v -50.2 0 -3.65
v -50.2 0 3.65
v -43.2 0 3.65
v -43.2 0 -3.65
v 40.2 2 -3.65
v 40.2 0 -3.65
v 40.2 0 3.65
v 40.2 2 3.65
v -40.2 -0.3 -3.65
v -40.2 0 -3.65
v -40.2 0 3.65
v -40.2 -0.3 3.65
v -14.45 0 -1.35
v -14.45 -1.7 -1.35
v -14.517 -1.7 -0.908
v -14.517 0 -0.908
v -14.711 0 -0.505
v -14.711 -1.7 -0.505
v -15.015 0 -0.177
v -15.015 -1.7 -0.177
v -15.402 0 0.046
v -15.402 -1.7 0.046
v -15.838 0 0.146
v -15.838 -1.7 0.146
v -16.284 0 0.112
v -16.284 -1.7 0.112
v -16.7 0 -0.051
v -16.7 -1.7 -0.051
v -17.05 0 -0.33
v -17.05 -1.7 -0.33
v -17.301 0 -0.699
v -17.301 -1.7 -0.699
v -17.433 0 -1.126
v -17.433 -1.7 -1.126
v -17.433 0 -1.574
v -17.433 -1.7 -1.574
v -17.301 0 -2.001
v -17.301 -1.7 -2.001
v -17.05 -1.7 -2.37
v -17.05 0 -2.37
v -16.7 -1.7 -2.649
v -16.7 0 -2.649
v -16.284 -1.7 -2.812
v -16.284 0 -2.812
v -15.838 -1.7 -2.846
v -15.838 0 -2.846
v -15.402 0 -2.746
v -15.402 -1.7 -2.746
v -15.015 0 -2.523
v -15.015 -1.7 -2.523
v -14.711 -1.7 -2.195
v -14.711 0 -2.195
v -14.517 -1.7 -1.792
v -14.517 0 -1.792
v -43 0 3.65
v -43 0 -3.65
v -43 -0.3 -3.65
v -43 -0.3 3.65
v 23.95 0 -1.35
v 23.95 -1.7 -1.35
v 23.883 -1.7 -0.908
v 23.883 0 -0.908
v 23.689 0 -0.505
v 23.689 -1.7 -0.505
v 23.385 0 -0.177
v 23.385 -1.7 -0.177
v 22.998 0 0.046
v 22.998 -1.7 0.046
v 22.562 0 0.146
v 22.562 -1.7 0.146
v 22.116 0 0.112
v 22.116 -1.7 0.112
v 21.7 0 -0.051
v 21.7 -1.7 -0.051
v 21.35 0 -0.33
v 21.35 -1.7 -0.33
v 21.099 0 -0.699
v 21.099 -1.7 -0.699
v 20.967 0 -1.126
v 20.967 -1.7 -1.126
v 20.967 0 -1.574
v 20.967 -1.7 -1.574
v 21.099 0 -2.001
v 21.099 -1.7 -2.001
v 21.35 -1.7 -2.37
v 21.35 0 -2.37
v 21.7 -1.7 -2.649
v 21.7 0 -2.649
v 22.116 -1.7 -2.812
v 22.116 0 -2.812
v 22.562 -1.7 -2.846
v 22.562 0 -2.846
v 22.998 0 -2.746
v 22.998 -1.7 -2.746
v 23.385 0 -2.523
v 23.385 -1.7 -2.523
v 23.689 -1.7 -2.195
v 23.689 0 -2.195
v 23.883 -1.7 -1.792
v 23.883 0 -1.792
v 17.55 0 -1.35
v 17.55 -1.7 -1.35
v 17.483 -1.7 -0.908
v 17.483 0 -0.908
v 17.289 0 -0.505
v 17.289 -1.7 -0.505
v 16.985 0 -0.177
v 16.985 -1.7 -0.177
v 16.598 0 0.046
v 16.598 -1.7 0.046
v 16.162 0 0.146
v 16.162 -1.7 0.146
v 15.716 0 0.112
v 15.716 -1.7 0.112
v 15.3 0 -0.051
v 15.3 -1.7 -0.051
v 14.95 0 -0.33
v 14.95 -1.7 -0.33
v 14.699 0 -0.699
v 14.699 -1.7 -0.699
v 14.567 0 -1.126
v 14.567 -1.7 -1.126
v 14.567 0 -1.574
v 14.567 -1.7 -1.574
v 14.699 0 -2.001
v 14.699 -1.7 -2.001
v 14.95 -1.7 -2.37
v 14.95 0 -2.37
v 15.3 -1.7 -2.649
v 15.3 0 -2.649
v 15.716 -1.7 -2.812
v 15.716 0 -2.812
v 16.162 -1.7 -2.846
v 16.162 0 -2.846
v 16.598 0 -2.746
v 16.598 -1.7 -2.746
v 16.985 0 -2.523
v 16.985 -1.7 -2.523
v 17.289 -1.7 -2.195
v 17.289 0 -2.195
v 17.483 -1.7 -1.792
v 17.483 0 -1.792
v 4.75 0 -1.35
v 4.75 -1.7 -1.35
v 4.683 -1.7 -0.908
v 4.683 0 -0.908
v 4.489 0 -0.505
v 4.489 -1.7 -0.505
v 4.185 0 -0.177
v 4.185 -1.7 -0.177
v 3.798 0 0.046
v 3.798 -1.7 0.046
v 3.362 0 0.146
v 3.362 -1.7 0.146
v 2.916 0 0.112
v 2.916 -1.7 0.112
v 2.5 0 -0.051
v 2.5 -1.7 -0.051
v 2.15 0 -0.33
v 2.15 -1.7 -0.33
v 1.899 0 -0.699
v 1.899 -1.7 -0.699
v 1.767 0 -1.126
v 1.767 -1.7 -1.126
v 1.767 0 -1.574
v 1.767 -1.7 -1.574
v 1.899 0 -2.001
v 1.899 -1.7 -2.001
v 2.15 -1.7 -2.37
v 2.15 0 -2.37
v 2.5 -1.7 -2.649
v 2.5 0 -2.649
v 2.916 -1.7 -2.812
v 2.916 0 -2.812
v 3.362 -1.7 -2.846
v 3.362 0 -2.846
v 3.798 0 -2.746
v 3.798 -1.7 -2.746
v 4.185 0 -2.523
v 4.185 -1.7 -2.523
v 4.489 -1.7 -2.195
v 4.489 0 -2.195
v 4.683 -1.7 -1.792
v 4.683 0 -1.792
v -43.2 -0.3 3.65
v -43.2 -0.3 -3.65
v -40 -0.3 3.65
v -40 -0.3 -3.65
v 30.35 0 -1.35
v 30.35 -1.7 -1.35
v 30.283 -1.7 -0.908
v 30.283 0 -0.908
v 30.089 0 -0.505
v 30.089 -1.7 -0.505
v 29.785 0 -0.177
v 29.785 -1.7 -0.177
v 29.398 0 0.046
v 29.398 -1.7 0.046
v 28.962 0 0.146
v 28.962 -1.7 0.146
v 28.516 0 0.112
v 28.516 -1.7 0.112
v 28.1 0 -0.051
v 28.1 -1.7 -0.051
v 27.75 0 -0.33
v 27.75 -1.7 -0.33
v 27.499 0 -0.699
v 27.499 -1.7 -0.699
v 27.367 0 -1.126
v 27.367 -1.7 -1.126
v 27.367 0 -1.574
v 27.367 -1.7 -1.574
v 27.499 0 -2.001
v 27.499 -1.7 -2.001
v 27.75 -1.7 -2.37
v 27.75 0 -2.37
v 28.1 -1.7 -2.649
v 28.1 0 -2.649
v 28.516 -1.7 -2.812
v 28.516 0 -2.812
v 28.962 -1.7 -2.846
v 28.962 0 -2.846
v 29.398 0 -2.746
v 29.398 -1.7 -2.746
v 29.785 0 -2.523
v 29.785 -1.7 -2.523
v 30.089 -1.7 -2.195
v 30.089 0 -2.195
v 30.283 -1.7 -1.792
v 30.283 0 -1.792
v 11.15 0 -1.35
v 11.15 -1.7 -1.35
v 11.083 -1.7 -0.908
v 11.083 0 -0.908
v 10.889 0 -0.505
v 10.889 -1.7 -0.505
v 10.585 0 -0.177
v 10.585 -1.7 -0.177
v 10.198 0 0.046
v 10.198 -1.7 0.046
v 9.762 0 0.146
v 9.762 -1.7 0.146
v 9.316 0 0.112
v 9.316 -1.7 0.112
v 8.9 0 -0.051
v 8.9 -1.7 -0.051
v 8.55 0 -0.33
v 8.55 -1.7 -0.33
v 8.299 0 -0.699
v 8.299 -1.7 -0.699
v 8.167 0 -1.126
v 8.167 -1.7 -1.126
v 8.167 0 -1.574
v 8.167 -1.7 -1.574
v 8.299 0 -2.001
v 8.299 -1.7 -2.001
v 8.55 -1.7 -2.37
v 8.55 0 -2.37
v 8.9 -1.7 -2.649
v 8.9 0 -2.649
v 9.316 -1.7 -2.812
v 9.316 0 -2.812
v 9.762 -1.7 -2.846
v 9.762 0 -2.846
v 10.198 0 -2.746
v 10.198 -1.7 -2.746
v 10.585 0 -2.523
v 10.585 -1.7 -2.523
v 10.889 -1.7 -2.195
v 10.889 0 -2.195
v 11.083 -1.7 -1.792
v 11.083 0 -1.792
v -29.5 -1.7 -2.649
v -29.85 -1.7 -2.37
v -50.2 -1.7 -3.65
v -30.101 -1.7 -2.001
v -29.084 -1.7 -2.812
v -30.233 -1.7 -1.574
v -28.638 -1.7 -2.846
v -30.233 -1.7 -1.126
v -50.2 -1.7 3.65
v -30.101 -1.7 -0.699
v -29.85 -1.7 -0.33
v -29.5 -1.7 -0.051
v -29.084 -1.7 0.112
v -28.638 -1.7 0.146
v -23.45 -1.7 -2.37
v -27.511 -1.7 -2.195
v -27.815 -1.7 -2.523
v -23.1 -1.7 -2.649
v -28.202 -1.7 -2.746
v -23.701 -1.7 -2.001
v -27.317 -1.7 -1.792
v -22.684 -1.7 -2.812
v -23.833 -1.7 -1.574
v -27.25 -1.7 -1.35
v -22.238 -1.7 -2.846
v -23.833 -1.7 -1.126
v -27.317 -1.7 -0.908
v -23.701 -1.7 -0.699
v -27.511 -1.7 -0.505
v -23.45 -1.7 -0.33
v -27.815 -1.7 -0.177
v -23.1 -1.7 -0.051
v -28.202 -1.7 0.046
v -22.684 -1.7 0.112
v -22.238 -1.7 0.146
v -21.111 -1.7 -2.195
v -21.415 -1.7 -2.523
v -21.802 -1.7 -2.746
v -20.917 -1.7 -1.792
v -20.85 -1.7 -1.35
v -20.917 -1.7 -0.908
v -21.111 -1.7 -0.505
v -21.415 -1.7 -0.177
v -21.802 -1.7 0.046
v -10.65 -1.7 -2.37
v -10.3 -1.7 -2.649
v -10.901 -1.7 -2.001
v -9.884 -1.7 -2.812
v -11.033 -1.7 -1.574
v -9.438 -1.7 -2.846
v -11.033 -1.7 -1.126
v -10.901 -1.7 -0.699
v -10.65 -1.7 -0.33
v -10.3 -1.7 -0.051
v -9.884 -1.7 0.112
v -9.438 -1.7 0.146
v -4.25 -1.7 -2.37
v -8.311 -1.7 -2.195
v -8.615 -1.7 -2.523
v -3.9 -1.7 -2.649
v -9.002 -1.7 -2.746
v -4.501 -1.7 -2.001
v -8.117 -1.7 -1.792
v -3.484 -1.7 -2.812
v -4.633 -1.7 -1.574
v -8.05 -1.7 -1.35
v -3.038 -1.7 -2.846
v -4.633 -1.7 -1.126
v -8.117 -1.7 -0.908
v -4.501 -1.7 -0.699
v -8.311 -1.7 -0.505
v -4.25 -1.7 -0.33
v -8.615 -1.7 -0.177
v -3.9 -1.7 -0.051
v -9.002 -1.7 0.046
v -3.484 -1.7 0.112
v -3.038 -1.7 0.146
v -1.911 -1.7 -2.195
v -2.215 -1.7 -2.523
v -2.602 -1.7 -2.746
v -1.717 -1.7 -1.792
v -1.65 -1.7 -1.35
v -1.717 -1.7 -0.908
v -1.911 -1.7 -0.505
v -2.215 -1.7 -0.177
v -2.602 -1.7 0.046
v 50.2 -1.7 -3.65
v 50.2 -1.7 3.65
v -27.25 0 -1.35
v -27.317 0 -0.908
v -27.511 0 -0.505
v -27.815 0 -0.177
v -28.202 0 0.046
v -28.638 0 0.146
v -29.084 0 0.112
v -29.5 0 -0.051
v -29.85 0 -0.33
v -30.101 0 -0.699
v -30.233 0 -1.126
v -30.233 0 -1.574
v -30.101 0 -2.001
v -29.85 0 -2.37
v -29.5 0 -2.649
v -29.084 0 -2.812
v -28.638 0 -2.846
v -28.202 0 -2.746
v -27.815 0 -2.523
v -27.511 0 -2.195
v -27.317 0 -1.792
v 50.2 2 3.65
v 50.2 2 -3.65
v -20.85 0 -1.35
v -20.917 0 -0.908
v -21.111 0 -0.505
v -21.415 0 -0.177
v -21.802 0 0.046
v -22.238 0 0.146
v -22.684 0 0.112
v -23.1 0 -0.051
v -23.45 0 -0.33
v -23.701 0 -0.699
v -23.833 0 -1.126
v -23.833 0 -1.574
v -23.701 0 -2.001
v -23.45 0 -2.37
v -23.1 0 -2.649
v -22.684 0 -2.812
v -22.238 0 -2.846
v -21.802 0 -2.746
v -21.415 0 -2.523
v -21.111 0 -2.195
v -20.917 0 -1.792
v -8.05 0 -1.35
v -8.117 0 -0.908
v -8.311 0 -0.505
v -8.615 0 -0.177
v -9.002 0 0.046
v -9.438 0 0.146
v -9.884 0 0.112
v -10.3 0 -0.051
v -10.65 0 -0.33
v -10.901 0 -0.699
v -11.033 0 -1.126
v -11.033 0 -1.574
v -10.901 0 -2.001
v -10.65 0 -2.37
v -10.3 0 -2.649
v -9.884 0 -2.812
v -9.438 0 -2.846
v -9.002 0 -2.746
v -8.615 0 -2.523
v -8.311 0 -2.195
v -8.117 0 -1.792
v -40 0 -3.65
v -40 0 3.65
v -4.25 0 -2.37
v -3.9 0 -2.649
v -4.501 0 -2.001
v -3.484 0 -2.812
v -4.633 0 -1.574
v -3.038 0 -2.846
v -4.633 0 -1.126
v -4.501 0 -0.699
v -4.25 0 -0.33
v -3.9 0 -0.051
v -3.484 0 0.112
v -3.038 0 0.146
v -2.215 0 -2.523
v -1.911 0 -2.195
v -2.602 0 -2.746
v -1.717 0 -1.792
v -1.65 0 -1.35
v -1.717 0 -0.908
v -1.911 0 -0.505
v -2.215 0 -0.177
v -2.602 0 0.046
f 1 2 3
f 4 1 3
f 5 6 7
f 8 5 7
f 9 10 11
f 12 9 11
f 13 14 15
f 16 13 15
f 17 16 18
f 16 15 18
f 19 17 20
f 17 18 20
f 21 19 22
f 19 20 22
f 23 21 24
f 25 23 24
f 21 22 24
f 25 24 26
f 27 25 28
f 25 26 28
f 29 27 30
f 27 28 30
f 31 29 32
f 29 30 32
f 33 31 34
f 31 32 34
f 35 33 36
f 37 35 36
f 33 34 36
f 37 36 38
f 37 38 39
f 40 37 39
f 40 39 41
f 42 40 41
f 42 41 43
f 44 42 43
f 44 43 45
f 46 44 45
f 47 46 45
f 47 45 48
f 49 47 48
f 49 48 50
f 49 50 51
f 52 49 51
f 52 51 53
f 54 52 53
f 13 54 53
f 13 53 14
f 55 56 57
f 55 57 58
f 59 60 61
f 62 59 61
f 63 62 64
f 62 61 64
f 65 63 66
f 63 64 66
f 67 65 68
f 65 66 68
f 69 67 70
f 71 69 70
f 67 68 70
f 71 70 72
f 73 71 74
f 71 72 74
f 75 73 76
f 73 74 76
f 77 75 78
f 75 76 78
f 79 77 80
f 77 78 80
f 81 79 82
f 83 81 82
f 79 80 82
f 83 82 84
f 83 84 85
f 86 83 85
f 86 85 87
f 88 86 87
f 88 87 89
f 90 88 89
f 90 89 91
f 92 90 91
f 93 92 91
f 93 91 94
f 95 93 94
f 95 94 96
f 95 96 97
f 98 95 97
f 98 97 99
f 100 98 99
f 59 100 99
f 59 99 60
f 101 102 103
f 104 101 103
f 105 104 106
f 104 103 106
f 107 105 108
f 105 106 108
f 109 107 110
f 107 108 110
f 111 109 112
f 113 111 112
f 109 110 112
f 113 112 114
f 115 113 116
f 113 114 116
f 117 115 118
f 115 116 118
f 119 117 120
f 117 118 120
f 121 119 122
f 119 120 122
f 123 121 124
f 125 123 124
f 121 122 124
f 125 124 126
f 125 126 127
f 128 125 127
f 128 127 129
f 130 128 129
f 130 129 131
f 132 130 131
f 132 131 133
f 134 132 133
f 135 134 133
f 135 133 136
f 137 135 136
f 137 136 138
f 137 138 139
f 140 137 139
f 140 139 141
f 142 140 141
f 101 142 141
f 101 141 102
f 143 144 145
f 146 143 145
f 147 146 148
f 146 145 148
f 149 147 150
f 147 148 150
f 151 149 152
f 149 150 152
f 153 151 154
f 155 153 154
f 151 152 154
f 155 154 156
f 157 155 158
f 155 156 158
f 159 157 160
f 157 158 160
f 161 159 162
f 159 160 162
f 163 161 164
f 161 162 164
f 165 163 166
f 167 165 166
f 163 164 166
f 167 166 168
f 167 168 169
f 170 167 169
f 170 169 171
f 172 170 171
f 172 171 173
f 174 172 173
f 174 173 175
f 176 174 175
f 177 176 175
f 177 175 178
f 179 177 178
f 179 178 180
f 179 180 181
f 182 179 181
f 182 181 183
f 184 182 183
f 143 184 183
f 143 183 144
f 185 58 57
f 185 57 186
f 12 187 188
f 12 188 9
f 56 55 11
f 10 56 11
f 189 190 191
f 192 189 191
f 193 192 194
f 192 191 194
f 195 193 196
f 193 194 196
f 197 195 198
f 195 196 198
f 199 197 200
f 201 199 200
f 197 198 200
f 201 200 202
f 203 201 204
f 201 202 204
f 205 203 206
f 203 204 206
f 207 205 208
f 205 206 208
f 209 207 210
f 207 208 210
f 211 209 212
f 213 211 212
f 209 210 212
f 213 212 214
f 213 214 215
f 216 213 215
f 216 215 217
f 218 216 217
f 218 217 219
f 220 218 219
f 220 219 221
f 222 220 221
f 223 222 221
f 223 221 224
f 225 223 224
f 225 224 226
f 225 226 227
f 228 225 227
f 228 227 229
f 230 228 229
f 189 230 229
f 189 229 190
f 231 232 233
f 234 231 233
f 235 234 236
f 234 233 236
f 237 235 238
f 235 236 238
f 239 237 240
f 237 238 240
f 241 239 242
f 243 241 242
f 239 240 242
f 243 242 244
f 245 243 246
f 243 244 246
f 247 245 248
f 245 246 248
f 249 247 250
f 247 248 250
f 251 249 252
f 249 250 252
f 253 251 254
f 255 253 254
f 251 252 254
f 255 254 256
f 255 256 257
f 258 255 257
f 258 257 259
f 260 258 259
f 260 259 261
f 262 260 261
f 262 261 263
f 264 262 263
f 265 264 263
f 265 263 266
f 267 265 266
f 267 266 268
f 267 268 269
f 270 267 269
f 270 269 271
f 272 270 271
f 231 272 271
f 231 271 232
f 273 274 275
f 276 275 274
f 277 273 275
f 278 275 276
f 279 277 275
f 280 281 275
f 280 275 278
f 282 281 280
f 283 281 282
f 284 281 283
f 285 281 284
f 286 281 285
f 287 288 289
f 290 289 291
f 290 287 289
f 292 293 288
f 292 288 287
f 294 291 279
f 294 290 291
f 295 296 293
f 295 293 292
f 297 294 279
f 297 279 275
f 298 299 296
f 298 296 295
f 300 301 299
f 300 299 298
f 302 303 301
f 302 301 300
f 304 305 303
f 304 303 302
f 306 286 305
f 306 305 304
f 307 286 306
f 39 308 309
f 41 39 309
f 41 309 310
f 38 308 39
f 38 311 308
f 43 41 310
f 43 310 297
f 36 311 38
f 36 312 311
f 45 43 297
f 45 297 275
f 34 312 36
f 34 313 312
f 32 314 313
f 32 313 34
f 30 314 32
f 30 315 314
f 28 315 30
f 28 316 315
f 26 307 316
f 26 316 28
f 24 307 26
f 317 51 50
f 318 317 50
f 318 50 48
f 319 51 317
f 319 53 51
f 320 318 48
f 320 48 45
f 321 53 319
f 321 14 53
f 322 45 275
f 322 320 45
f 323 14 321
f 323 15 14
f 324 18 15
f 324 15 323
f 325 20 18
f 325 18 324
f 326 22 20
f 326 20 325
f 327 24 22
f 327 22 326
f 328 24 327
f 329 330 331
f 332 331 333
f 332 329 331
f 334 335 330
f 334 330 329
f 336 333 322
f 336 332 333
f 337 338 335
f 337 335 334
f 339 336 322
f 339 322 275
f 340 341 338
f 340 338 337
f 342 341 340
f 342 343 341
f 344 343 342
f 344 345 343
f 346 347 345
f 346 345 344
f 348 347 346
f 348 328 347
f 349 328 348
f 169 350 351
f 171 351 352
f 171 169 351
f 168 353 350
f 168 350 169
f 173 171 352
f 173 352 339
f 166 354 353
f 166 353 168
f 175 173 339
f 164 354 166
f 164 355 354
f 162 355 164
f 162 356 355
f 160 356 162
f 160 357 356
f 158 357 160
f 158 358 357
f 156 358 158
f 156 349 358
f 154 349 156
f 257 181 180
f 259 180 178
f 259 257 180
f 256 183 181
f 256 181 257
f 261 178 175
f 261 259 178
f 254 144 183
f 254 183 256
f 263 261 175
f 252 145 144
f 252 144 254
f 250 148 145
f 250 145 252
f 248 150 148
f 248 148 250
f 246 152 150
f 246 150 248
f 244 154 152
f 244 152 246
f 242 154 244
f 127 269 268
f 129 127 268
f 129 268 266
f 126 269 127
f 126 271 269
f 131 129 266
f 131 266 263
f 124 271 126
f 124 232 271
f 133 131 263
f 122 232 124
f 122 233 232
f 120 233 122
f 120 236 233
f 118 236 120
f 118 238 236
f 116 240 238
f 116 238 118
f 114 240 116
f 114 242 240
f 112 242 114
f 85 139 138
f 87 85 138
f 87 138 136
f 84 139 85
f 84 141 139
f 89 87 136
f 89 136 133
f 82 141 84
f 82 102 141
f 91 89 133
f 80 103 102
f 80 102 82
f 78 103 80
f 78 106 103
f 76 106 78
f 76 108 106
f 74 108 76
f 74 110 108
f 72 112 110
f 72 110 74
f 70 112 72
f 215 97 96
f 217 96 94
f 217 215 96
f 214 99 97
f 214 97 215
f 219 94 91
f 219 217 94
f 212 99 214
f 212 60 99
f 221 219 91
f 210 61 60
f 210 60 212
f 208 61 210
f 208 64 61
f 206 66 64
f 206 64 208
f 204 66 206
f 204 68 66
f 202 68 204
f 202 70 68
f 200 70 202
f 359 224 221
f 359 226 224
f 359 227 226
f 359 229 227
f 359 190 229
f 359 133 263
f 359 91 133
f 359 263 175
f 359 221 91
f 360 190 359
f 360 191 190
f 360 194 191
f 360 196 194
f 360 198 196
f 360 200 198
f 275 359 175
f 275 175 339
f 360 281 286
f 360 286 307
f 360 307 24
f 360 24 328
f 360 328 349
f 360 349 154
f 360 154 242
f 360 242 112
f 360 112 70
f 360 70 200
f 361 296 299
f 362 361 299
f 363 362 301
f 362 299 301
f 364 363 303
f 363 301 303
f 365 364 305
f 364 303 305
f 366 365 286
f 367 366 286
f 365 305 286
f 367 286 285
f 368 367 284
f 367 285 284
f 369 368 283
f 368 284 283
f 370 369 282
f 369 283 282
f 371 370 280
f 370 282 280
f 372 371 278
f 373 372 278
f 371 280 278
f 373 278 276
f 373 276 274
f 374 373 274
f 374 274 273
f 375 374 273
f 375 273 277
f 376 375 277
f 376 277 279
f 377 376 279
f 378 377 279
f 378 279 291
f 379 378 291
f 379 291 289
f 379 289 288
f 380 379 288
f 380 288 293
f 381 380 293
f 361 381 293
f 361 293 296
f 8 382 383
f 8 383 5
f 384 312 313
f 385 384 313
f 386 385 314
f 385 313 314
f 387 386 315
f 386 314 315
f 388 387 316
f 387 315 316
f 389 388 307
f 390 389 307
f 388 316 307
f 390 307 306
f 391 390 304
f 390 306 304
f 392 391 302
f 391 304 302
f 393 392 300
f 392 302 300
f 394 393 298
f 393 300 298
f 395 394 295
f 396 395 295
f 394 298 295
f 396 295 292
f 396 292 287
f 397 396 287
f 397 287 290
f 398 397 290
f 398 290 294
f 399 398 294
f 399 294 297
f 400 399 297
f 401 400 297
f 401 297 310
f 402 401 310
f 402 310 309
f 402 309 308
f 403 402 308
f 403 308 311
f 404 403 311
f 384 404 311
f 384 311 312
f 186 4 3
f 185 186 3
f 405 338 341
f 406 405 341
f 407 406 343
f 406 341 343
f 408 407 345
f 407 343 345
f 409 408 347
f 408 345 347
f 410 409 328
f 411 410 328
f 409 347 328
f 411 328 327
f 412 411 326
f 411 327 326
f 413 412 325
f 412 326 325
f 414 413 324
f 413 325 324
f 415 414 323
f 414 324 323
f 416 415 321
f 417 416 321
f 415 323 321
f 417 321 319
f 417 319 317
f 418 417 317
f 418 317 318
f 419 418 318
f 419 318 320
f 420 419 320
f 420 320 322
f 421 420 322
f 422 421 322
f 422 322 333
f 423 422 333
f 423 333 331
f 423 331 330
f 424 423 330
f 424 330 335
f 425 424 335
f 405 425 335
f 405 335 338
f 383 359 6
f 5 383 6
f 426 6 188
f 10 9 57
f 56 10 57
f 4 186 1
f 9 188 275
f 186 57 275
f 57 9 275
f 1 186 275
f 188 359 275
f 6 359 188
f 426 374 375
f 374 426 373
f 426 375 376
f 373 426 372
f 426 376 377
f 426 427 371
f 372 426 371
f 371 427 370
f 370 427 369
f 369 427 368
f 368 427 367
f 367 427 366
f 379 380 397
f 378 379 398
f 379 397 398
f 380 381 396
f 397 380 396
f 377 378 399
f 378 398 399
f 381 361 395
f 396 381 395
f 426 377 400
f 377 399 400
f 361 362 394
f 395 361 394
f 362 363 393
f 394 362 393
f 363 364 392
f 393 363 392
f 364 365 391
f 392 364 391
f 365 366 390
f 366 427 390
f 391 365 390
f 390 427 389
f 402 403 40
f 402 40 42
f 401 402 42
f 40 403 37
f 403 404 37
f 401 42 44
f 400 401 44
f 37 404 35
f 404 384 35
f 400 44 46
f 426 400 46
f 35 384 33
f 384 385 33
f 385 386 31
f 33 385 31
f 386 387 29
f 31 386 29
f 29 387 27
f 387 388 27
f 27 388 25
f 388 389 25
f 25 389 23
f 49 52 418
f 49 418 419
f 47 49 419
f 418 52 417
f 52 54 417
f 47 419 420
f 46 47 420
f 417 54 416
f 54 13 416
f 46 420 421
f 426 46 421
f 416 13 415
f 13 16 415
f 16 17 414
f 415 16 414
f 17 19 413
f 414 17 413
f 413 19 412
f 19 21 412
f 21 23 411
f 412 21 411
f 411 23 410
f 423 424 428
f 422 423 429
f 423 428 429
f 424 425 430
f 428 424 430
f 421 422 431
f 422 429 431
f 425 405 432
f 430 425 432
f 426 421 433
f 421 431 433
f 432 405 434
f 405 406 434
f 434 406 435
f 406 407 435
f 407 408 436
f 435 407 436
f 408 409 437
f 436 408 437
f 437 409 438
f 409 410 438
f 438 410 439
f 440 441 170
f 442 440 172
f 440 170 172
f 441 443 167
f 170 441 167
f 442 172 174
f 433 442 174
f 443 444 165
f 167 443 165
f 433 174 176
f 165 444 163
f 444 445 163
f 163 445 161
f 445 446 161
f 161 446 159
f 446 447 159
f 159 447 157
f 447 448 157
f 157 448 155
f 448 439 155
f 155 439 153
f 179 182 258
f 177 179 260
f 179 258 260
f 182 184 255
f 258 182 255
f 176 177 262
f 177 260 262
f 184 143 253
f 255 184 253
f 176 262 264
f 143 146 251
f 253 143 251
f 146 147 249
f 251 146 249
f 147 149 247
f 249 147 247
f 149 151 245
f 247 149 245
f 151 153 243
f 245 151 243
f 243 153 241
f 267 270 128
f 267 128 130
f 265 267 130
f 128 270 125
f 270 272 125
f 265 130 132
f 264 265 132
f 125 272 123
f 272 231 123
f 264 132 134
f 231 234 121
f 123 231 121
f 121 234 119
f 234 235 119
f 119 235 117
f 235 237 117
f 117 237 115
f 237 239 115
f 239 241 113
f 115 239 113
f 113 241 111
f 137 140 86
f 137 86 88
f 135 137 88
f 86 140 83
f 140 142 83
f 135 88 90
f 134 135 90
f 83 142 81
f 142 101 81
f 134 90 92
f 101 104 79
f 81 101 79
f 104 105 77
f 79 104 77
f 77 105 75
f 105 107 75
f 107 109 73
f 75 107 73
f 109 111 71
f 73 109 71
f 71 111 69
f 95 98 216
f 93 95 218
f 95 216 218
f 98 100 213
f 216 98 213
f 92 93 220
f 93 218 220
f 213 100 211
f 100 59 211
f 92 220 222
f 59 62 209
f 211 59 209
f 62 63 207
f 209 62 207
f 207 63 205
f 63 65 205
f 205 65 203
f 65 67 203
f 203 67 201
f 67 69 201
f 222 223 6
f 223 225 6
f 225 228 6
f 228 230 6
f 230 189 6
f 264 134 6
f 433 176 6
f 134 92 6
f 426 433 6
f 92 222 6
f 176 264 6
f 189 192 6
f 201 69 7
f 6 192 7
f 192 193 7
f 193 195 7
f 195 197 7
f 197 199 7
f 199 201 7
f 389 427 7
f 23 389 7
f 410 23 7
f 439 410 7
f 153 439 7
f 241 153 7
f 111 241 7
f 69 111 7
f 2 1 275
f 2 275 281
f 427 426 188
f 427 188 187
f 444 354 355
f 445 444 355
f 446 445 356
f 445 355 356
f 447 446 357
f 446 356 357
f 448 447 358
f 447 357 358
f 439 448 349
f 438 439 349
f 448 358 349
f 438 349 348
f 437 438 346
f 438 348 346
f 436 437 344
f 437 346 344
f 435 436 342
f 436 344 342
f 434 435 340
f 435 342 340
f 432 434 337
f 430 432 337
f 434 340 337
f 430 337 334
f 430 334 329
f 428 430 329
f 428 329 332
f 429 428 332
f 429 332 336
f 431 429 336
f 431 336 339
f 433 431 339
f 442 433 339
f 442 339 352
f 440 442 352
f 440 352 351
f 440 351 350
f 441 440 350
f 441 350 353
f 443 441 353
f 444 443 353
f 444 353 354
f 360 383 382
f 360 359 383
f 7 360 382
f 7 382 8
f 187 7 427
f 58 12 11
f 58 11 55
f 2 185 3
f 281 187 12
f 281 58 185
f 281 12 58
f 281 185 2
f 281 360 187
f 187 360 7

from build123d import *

# Parameters (mm, degrees)
F0_W      = 100.4
F0_H      = 7.3
F1_DEPTH  = 1.7
F2_R      = 1.5
F3_DEPTH  = 1.701
F4_W      = 10
F4_H      = 7.3
F5_DEPTH  = 2
F7_W      = 0.2
F7_H      = 7.3
F8_DEPTH  = 0.3
F9_W      = 0.2
F9_H      = 7.3
F10_DEPTH = 0.3


with BuildPart() as f1:
    # F0 (on Front) → F1 (new body)
    with BuildSketch(Plane.XZ):
        Rectangle(F0_W, F0_H)
    extrude(amount=F1_DEPTH)

    # F2 (on face) → F3 (cut, through all)
    with BuildSketch(Plane.XZ.offset(1.7)):
        with Locations((-28.75, -1.35)):
            Circle(F2_R)
        with Locations((-22.35, -1.35)):
            Circle(F2_R)
        with Locations((-15.95, -1.35)):
            Circle(F2_R)
        with Locations((-9.55, -1.35)):
            Circle(F2_R)
        with Locations((-3.15, -1.35)):
            Circle(F2_R)
        with Locations((3.25, -1.35)):
            Circle(F2_R)
        with Locations((9.65, -1.35)):
            Circle(F2_R)
        with Locations((16.05, -1.35)):
            Circle(F2_R)
        with Locations((22.45, -1.35)):
            Circle(F2_R)
        with Locations((28.85, -1.35)):
            Circle(F2_R)
    extrude(amount=-F3_DEPTH, mode=Mode.SUBTRACT)

    # F4 (on face) → F5 (join)
    with BuildSketch(Plane(origin=(0, 0, 0), x_dir=(-1, 0, 0), z_dir=(0, 1, 0))):
        with Locations((-45.2, 0)):
            Rectangle(F4_W, F4_H)
    extrude(amount=F5_DEPTH)

    # F7 (on face) → F8 (cut)
    with BuildSketch(Plane(origin=(0, 0, 0), x_dir=(-1, 0, 0), z_dir=(0, 1, 0))):
        with Locations((40.1, 0)):
            Rectangle(F7_W, F7_H)
    extrude(amount=-F8_DEPTH, mode=Mode.SUBTRACT)

    # F9 (on face) → F10 (cut)
    with BuildSketch(Plane(origin=(0, 0, 0), x_dir=(-1, 0, 0), z_dir=(0, 1, 0))):
        with Locations((43.1, 0)):
            Rectangle(F9_W, F9_H)
    extrude(amount=-F10_DEPTH, mode=Mode.SUBTRACT)


solid = f1.part
